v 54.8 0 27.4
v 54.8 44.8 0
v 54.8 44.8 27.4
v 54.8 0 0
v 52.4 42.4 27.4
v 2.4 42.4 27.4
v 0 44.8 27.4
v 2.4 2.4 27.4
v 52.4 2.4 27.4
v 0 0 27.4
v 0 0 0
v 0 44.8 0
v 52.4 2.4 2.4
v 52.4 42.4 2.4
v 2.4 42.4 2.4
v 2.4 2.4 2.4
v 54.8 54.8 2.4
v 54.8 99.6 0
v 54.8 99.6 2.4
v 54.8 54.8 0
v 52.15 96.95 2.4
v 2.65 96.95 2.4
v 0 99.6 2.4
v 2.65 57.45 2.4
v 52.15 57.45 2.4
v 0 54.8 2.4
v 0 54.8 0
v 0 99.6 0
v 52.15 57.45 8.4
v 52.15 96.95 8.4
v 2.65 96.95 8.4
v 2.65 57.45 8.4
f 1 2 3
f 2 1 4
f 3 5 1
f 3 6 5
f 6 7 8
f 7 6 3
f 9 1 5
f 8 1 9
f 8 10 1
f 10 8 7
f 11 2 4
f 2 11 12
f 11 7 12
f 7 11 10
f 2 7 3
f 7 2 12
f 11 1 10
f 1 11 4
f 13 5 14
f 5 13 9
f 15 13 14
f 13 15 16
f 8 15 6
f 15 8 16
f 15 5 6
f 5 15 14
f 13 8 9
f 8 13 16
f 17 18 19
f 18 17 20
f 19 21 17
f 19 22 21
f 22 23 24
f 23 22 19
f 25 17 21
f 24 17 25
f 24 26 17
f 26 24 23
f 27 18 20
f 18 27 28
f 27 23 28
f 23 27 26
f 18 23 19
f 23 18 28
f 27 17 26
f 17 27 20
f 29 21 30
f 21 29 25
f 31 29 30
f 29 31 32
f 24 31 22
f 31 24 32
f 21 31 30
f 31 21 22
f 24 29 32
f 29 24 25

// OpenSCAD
// Box with a press-fit lid - a hollow rectangular box (open top) and a separate lid whose plug
// drops into the opening. The two parts are laid side by side. NOVEL general part.
//
// @desc hollow box with a separate press-fit lid
// @prompt Design a small box with a lid in OpenSCAD: an inner space {il} by {iw} by {ih} mm with {wall} mm walls, and a separate lid whose plug drops {lip} mm into the opening. Lay the two parts side by side. Reply with a single complete OpenSCAD file.
// @param il   inner length, mm     [20:80]
// @param iw   inner width, mm      [20:60]
// @param ih   inner height, mm     [10:50]
// @param wall wall thickness, mm   [1.6:4]
// @param lip  lid plug depth, mm   [3:10]

il   = 50;
iw   = 40;
ih   = 25;
wall = 2.4;
lip  = 6;

$fn = 32;

ol = il + 2 * wall;
ow = iw + 2 * wall;

module box() {
    difference() {
        cube([ol, ow, ih + wall]);
        translate([wall, wall, wall]) cube([il, iw, ih + 1]);   // open-top cavity
    }
}

module lid() {
    cl = il - 0.5;                 // plug: 0.25 mm clearance per side
    cw = iw - 0.5;
    union() {
        cube([ol, ow, wall]);                                    // top plate, full footprint
        translate([(ol - cl) / 2, (ow - cw) / 2, 0])
            cube([cl, cw, wall + lip]);                          // plug (overlaps the plate -> one solid)
    }
}

box();
translate([0, ow + 10, 0]) lid();
